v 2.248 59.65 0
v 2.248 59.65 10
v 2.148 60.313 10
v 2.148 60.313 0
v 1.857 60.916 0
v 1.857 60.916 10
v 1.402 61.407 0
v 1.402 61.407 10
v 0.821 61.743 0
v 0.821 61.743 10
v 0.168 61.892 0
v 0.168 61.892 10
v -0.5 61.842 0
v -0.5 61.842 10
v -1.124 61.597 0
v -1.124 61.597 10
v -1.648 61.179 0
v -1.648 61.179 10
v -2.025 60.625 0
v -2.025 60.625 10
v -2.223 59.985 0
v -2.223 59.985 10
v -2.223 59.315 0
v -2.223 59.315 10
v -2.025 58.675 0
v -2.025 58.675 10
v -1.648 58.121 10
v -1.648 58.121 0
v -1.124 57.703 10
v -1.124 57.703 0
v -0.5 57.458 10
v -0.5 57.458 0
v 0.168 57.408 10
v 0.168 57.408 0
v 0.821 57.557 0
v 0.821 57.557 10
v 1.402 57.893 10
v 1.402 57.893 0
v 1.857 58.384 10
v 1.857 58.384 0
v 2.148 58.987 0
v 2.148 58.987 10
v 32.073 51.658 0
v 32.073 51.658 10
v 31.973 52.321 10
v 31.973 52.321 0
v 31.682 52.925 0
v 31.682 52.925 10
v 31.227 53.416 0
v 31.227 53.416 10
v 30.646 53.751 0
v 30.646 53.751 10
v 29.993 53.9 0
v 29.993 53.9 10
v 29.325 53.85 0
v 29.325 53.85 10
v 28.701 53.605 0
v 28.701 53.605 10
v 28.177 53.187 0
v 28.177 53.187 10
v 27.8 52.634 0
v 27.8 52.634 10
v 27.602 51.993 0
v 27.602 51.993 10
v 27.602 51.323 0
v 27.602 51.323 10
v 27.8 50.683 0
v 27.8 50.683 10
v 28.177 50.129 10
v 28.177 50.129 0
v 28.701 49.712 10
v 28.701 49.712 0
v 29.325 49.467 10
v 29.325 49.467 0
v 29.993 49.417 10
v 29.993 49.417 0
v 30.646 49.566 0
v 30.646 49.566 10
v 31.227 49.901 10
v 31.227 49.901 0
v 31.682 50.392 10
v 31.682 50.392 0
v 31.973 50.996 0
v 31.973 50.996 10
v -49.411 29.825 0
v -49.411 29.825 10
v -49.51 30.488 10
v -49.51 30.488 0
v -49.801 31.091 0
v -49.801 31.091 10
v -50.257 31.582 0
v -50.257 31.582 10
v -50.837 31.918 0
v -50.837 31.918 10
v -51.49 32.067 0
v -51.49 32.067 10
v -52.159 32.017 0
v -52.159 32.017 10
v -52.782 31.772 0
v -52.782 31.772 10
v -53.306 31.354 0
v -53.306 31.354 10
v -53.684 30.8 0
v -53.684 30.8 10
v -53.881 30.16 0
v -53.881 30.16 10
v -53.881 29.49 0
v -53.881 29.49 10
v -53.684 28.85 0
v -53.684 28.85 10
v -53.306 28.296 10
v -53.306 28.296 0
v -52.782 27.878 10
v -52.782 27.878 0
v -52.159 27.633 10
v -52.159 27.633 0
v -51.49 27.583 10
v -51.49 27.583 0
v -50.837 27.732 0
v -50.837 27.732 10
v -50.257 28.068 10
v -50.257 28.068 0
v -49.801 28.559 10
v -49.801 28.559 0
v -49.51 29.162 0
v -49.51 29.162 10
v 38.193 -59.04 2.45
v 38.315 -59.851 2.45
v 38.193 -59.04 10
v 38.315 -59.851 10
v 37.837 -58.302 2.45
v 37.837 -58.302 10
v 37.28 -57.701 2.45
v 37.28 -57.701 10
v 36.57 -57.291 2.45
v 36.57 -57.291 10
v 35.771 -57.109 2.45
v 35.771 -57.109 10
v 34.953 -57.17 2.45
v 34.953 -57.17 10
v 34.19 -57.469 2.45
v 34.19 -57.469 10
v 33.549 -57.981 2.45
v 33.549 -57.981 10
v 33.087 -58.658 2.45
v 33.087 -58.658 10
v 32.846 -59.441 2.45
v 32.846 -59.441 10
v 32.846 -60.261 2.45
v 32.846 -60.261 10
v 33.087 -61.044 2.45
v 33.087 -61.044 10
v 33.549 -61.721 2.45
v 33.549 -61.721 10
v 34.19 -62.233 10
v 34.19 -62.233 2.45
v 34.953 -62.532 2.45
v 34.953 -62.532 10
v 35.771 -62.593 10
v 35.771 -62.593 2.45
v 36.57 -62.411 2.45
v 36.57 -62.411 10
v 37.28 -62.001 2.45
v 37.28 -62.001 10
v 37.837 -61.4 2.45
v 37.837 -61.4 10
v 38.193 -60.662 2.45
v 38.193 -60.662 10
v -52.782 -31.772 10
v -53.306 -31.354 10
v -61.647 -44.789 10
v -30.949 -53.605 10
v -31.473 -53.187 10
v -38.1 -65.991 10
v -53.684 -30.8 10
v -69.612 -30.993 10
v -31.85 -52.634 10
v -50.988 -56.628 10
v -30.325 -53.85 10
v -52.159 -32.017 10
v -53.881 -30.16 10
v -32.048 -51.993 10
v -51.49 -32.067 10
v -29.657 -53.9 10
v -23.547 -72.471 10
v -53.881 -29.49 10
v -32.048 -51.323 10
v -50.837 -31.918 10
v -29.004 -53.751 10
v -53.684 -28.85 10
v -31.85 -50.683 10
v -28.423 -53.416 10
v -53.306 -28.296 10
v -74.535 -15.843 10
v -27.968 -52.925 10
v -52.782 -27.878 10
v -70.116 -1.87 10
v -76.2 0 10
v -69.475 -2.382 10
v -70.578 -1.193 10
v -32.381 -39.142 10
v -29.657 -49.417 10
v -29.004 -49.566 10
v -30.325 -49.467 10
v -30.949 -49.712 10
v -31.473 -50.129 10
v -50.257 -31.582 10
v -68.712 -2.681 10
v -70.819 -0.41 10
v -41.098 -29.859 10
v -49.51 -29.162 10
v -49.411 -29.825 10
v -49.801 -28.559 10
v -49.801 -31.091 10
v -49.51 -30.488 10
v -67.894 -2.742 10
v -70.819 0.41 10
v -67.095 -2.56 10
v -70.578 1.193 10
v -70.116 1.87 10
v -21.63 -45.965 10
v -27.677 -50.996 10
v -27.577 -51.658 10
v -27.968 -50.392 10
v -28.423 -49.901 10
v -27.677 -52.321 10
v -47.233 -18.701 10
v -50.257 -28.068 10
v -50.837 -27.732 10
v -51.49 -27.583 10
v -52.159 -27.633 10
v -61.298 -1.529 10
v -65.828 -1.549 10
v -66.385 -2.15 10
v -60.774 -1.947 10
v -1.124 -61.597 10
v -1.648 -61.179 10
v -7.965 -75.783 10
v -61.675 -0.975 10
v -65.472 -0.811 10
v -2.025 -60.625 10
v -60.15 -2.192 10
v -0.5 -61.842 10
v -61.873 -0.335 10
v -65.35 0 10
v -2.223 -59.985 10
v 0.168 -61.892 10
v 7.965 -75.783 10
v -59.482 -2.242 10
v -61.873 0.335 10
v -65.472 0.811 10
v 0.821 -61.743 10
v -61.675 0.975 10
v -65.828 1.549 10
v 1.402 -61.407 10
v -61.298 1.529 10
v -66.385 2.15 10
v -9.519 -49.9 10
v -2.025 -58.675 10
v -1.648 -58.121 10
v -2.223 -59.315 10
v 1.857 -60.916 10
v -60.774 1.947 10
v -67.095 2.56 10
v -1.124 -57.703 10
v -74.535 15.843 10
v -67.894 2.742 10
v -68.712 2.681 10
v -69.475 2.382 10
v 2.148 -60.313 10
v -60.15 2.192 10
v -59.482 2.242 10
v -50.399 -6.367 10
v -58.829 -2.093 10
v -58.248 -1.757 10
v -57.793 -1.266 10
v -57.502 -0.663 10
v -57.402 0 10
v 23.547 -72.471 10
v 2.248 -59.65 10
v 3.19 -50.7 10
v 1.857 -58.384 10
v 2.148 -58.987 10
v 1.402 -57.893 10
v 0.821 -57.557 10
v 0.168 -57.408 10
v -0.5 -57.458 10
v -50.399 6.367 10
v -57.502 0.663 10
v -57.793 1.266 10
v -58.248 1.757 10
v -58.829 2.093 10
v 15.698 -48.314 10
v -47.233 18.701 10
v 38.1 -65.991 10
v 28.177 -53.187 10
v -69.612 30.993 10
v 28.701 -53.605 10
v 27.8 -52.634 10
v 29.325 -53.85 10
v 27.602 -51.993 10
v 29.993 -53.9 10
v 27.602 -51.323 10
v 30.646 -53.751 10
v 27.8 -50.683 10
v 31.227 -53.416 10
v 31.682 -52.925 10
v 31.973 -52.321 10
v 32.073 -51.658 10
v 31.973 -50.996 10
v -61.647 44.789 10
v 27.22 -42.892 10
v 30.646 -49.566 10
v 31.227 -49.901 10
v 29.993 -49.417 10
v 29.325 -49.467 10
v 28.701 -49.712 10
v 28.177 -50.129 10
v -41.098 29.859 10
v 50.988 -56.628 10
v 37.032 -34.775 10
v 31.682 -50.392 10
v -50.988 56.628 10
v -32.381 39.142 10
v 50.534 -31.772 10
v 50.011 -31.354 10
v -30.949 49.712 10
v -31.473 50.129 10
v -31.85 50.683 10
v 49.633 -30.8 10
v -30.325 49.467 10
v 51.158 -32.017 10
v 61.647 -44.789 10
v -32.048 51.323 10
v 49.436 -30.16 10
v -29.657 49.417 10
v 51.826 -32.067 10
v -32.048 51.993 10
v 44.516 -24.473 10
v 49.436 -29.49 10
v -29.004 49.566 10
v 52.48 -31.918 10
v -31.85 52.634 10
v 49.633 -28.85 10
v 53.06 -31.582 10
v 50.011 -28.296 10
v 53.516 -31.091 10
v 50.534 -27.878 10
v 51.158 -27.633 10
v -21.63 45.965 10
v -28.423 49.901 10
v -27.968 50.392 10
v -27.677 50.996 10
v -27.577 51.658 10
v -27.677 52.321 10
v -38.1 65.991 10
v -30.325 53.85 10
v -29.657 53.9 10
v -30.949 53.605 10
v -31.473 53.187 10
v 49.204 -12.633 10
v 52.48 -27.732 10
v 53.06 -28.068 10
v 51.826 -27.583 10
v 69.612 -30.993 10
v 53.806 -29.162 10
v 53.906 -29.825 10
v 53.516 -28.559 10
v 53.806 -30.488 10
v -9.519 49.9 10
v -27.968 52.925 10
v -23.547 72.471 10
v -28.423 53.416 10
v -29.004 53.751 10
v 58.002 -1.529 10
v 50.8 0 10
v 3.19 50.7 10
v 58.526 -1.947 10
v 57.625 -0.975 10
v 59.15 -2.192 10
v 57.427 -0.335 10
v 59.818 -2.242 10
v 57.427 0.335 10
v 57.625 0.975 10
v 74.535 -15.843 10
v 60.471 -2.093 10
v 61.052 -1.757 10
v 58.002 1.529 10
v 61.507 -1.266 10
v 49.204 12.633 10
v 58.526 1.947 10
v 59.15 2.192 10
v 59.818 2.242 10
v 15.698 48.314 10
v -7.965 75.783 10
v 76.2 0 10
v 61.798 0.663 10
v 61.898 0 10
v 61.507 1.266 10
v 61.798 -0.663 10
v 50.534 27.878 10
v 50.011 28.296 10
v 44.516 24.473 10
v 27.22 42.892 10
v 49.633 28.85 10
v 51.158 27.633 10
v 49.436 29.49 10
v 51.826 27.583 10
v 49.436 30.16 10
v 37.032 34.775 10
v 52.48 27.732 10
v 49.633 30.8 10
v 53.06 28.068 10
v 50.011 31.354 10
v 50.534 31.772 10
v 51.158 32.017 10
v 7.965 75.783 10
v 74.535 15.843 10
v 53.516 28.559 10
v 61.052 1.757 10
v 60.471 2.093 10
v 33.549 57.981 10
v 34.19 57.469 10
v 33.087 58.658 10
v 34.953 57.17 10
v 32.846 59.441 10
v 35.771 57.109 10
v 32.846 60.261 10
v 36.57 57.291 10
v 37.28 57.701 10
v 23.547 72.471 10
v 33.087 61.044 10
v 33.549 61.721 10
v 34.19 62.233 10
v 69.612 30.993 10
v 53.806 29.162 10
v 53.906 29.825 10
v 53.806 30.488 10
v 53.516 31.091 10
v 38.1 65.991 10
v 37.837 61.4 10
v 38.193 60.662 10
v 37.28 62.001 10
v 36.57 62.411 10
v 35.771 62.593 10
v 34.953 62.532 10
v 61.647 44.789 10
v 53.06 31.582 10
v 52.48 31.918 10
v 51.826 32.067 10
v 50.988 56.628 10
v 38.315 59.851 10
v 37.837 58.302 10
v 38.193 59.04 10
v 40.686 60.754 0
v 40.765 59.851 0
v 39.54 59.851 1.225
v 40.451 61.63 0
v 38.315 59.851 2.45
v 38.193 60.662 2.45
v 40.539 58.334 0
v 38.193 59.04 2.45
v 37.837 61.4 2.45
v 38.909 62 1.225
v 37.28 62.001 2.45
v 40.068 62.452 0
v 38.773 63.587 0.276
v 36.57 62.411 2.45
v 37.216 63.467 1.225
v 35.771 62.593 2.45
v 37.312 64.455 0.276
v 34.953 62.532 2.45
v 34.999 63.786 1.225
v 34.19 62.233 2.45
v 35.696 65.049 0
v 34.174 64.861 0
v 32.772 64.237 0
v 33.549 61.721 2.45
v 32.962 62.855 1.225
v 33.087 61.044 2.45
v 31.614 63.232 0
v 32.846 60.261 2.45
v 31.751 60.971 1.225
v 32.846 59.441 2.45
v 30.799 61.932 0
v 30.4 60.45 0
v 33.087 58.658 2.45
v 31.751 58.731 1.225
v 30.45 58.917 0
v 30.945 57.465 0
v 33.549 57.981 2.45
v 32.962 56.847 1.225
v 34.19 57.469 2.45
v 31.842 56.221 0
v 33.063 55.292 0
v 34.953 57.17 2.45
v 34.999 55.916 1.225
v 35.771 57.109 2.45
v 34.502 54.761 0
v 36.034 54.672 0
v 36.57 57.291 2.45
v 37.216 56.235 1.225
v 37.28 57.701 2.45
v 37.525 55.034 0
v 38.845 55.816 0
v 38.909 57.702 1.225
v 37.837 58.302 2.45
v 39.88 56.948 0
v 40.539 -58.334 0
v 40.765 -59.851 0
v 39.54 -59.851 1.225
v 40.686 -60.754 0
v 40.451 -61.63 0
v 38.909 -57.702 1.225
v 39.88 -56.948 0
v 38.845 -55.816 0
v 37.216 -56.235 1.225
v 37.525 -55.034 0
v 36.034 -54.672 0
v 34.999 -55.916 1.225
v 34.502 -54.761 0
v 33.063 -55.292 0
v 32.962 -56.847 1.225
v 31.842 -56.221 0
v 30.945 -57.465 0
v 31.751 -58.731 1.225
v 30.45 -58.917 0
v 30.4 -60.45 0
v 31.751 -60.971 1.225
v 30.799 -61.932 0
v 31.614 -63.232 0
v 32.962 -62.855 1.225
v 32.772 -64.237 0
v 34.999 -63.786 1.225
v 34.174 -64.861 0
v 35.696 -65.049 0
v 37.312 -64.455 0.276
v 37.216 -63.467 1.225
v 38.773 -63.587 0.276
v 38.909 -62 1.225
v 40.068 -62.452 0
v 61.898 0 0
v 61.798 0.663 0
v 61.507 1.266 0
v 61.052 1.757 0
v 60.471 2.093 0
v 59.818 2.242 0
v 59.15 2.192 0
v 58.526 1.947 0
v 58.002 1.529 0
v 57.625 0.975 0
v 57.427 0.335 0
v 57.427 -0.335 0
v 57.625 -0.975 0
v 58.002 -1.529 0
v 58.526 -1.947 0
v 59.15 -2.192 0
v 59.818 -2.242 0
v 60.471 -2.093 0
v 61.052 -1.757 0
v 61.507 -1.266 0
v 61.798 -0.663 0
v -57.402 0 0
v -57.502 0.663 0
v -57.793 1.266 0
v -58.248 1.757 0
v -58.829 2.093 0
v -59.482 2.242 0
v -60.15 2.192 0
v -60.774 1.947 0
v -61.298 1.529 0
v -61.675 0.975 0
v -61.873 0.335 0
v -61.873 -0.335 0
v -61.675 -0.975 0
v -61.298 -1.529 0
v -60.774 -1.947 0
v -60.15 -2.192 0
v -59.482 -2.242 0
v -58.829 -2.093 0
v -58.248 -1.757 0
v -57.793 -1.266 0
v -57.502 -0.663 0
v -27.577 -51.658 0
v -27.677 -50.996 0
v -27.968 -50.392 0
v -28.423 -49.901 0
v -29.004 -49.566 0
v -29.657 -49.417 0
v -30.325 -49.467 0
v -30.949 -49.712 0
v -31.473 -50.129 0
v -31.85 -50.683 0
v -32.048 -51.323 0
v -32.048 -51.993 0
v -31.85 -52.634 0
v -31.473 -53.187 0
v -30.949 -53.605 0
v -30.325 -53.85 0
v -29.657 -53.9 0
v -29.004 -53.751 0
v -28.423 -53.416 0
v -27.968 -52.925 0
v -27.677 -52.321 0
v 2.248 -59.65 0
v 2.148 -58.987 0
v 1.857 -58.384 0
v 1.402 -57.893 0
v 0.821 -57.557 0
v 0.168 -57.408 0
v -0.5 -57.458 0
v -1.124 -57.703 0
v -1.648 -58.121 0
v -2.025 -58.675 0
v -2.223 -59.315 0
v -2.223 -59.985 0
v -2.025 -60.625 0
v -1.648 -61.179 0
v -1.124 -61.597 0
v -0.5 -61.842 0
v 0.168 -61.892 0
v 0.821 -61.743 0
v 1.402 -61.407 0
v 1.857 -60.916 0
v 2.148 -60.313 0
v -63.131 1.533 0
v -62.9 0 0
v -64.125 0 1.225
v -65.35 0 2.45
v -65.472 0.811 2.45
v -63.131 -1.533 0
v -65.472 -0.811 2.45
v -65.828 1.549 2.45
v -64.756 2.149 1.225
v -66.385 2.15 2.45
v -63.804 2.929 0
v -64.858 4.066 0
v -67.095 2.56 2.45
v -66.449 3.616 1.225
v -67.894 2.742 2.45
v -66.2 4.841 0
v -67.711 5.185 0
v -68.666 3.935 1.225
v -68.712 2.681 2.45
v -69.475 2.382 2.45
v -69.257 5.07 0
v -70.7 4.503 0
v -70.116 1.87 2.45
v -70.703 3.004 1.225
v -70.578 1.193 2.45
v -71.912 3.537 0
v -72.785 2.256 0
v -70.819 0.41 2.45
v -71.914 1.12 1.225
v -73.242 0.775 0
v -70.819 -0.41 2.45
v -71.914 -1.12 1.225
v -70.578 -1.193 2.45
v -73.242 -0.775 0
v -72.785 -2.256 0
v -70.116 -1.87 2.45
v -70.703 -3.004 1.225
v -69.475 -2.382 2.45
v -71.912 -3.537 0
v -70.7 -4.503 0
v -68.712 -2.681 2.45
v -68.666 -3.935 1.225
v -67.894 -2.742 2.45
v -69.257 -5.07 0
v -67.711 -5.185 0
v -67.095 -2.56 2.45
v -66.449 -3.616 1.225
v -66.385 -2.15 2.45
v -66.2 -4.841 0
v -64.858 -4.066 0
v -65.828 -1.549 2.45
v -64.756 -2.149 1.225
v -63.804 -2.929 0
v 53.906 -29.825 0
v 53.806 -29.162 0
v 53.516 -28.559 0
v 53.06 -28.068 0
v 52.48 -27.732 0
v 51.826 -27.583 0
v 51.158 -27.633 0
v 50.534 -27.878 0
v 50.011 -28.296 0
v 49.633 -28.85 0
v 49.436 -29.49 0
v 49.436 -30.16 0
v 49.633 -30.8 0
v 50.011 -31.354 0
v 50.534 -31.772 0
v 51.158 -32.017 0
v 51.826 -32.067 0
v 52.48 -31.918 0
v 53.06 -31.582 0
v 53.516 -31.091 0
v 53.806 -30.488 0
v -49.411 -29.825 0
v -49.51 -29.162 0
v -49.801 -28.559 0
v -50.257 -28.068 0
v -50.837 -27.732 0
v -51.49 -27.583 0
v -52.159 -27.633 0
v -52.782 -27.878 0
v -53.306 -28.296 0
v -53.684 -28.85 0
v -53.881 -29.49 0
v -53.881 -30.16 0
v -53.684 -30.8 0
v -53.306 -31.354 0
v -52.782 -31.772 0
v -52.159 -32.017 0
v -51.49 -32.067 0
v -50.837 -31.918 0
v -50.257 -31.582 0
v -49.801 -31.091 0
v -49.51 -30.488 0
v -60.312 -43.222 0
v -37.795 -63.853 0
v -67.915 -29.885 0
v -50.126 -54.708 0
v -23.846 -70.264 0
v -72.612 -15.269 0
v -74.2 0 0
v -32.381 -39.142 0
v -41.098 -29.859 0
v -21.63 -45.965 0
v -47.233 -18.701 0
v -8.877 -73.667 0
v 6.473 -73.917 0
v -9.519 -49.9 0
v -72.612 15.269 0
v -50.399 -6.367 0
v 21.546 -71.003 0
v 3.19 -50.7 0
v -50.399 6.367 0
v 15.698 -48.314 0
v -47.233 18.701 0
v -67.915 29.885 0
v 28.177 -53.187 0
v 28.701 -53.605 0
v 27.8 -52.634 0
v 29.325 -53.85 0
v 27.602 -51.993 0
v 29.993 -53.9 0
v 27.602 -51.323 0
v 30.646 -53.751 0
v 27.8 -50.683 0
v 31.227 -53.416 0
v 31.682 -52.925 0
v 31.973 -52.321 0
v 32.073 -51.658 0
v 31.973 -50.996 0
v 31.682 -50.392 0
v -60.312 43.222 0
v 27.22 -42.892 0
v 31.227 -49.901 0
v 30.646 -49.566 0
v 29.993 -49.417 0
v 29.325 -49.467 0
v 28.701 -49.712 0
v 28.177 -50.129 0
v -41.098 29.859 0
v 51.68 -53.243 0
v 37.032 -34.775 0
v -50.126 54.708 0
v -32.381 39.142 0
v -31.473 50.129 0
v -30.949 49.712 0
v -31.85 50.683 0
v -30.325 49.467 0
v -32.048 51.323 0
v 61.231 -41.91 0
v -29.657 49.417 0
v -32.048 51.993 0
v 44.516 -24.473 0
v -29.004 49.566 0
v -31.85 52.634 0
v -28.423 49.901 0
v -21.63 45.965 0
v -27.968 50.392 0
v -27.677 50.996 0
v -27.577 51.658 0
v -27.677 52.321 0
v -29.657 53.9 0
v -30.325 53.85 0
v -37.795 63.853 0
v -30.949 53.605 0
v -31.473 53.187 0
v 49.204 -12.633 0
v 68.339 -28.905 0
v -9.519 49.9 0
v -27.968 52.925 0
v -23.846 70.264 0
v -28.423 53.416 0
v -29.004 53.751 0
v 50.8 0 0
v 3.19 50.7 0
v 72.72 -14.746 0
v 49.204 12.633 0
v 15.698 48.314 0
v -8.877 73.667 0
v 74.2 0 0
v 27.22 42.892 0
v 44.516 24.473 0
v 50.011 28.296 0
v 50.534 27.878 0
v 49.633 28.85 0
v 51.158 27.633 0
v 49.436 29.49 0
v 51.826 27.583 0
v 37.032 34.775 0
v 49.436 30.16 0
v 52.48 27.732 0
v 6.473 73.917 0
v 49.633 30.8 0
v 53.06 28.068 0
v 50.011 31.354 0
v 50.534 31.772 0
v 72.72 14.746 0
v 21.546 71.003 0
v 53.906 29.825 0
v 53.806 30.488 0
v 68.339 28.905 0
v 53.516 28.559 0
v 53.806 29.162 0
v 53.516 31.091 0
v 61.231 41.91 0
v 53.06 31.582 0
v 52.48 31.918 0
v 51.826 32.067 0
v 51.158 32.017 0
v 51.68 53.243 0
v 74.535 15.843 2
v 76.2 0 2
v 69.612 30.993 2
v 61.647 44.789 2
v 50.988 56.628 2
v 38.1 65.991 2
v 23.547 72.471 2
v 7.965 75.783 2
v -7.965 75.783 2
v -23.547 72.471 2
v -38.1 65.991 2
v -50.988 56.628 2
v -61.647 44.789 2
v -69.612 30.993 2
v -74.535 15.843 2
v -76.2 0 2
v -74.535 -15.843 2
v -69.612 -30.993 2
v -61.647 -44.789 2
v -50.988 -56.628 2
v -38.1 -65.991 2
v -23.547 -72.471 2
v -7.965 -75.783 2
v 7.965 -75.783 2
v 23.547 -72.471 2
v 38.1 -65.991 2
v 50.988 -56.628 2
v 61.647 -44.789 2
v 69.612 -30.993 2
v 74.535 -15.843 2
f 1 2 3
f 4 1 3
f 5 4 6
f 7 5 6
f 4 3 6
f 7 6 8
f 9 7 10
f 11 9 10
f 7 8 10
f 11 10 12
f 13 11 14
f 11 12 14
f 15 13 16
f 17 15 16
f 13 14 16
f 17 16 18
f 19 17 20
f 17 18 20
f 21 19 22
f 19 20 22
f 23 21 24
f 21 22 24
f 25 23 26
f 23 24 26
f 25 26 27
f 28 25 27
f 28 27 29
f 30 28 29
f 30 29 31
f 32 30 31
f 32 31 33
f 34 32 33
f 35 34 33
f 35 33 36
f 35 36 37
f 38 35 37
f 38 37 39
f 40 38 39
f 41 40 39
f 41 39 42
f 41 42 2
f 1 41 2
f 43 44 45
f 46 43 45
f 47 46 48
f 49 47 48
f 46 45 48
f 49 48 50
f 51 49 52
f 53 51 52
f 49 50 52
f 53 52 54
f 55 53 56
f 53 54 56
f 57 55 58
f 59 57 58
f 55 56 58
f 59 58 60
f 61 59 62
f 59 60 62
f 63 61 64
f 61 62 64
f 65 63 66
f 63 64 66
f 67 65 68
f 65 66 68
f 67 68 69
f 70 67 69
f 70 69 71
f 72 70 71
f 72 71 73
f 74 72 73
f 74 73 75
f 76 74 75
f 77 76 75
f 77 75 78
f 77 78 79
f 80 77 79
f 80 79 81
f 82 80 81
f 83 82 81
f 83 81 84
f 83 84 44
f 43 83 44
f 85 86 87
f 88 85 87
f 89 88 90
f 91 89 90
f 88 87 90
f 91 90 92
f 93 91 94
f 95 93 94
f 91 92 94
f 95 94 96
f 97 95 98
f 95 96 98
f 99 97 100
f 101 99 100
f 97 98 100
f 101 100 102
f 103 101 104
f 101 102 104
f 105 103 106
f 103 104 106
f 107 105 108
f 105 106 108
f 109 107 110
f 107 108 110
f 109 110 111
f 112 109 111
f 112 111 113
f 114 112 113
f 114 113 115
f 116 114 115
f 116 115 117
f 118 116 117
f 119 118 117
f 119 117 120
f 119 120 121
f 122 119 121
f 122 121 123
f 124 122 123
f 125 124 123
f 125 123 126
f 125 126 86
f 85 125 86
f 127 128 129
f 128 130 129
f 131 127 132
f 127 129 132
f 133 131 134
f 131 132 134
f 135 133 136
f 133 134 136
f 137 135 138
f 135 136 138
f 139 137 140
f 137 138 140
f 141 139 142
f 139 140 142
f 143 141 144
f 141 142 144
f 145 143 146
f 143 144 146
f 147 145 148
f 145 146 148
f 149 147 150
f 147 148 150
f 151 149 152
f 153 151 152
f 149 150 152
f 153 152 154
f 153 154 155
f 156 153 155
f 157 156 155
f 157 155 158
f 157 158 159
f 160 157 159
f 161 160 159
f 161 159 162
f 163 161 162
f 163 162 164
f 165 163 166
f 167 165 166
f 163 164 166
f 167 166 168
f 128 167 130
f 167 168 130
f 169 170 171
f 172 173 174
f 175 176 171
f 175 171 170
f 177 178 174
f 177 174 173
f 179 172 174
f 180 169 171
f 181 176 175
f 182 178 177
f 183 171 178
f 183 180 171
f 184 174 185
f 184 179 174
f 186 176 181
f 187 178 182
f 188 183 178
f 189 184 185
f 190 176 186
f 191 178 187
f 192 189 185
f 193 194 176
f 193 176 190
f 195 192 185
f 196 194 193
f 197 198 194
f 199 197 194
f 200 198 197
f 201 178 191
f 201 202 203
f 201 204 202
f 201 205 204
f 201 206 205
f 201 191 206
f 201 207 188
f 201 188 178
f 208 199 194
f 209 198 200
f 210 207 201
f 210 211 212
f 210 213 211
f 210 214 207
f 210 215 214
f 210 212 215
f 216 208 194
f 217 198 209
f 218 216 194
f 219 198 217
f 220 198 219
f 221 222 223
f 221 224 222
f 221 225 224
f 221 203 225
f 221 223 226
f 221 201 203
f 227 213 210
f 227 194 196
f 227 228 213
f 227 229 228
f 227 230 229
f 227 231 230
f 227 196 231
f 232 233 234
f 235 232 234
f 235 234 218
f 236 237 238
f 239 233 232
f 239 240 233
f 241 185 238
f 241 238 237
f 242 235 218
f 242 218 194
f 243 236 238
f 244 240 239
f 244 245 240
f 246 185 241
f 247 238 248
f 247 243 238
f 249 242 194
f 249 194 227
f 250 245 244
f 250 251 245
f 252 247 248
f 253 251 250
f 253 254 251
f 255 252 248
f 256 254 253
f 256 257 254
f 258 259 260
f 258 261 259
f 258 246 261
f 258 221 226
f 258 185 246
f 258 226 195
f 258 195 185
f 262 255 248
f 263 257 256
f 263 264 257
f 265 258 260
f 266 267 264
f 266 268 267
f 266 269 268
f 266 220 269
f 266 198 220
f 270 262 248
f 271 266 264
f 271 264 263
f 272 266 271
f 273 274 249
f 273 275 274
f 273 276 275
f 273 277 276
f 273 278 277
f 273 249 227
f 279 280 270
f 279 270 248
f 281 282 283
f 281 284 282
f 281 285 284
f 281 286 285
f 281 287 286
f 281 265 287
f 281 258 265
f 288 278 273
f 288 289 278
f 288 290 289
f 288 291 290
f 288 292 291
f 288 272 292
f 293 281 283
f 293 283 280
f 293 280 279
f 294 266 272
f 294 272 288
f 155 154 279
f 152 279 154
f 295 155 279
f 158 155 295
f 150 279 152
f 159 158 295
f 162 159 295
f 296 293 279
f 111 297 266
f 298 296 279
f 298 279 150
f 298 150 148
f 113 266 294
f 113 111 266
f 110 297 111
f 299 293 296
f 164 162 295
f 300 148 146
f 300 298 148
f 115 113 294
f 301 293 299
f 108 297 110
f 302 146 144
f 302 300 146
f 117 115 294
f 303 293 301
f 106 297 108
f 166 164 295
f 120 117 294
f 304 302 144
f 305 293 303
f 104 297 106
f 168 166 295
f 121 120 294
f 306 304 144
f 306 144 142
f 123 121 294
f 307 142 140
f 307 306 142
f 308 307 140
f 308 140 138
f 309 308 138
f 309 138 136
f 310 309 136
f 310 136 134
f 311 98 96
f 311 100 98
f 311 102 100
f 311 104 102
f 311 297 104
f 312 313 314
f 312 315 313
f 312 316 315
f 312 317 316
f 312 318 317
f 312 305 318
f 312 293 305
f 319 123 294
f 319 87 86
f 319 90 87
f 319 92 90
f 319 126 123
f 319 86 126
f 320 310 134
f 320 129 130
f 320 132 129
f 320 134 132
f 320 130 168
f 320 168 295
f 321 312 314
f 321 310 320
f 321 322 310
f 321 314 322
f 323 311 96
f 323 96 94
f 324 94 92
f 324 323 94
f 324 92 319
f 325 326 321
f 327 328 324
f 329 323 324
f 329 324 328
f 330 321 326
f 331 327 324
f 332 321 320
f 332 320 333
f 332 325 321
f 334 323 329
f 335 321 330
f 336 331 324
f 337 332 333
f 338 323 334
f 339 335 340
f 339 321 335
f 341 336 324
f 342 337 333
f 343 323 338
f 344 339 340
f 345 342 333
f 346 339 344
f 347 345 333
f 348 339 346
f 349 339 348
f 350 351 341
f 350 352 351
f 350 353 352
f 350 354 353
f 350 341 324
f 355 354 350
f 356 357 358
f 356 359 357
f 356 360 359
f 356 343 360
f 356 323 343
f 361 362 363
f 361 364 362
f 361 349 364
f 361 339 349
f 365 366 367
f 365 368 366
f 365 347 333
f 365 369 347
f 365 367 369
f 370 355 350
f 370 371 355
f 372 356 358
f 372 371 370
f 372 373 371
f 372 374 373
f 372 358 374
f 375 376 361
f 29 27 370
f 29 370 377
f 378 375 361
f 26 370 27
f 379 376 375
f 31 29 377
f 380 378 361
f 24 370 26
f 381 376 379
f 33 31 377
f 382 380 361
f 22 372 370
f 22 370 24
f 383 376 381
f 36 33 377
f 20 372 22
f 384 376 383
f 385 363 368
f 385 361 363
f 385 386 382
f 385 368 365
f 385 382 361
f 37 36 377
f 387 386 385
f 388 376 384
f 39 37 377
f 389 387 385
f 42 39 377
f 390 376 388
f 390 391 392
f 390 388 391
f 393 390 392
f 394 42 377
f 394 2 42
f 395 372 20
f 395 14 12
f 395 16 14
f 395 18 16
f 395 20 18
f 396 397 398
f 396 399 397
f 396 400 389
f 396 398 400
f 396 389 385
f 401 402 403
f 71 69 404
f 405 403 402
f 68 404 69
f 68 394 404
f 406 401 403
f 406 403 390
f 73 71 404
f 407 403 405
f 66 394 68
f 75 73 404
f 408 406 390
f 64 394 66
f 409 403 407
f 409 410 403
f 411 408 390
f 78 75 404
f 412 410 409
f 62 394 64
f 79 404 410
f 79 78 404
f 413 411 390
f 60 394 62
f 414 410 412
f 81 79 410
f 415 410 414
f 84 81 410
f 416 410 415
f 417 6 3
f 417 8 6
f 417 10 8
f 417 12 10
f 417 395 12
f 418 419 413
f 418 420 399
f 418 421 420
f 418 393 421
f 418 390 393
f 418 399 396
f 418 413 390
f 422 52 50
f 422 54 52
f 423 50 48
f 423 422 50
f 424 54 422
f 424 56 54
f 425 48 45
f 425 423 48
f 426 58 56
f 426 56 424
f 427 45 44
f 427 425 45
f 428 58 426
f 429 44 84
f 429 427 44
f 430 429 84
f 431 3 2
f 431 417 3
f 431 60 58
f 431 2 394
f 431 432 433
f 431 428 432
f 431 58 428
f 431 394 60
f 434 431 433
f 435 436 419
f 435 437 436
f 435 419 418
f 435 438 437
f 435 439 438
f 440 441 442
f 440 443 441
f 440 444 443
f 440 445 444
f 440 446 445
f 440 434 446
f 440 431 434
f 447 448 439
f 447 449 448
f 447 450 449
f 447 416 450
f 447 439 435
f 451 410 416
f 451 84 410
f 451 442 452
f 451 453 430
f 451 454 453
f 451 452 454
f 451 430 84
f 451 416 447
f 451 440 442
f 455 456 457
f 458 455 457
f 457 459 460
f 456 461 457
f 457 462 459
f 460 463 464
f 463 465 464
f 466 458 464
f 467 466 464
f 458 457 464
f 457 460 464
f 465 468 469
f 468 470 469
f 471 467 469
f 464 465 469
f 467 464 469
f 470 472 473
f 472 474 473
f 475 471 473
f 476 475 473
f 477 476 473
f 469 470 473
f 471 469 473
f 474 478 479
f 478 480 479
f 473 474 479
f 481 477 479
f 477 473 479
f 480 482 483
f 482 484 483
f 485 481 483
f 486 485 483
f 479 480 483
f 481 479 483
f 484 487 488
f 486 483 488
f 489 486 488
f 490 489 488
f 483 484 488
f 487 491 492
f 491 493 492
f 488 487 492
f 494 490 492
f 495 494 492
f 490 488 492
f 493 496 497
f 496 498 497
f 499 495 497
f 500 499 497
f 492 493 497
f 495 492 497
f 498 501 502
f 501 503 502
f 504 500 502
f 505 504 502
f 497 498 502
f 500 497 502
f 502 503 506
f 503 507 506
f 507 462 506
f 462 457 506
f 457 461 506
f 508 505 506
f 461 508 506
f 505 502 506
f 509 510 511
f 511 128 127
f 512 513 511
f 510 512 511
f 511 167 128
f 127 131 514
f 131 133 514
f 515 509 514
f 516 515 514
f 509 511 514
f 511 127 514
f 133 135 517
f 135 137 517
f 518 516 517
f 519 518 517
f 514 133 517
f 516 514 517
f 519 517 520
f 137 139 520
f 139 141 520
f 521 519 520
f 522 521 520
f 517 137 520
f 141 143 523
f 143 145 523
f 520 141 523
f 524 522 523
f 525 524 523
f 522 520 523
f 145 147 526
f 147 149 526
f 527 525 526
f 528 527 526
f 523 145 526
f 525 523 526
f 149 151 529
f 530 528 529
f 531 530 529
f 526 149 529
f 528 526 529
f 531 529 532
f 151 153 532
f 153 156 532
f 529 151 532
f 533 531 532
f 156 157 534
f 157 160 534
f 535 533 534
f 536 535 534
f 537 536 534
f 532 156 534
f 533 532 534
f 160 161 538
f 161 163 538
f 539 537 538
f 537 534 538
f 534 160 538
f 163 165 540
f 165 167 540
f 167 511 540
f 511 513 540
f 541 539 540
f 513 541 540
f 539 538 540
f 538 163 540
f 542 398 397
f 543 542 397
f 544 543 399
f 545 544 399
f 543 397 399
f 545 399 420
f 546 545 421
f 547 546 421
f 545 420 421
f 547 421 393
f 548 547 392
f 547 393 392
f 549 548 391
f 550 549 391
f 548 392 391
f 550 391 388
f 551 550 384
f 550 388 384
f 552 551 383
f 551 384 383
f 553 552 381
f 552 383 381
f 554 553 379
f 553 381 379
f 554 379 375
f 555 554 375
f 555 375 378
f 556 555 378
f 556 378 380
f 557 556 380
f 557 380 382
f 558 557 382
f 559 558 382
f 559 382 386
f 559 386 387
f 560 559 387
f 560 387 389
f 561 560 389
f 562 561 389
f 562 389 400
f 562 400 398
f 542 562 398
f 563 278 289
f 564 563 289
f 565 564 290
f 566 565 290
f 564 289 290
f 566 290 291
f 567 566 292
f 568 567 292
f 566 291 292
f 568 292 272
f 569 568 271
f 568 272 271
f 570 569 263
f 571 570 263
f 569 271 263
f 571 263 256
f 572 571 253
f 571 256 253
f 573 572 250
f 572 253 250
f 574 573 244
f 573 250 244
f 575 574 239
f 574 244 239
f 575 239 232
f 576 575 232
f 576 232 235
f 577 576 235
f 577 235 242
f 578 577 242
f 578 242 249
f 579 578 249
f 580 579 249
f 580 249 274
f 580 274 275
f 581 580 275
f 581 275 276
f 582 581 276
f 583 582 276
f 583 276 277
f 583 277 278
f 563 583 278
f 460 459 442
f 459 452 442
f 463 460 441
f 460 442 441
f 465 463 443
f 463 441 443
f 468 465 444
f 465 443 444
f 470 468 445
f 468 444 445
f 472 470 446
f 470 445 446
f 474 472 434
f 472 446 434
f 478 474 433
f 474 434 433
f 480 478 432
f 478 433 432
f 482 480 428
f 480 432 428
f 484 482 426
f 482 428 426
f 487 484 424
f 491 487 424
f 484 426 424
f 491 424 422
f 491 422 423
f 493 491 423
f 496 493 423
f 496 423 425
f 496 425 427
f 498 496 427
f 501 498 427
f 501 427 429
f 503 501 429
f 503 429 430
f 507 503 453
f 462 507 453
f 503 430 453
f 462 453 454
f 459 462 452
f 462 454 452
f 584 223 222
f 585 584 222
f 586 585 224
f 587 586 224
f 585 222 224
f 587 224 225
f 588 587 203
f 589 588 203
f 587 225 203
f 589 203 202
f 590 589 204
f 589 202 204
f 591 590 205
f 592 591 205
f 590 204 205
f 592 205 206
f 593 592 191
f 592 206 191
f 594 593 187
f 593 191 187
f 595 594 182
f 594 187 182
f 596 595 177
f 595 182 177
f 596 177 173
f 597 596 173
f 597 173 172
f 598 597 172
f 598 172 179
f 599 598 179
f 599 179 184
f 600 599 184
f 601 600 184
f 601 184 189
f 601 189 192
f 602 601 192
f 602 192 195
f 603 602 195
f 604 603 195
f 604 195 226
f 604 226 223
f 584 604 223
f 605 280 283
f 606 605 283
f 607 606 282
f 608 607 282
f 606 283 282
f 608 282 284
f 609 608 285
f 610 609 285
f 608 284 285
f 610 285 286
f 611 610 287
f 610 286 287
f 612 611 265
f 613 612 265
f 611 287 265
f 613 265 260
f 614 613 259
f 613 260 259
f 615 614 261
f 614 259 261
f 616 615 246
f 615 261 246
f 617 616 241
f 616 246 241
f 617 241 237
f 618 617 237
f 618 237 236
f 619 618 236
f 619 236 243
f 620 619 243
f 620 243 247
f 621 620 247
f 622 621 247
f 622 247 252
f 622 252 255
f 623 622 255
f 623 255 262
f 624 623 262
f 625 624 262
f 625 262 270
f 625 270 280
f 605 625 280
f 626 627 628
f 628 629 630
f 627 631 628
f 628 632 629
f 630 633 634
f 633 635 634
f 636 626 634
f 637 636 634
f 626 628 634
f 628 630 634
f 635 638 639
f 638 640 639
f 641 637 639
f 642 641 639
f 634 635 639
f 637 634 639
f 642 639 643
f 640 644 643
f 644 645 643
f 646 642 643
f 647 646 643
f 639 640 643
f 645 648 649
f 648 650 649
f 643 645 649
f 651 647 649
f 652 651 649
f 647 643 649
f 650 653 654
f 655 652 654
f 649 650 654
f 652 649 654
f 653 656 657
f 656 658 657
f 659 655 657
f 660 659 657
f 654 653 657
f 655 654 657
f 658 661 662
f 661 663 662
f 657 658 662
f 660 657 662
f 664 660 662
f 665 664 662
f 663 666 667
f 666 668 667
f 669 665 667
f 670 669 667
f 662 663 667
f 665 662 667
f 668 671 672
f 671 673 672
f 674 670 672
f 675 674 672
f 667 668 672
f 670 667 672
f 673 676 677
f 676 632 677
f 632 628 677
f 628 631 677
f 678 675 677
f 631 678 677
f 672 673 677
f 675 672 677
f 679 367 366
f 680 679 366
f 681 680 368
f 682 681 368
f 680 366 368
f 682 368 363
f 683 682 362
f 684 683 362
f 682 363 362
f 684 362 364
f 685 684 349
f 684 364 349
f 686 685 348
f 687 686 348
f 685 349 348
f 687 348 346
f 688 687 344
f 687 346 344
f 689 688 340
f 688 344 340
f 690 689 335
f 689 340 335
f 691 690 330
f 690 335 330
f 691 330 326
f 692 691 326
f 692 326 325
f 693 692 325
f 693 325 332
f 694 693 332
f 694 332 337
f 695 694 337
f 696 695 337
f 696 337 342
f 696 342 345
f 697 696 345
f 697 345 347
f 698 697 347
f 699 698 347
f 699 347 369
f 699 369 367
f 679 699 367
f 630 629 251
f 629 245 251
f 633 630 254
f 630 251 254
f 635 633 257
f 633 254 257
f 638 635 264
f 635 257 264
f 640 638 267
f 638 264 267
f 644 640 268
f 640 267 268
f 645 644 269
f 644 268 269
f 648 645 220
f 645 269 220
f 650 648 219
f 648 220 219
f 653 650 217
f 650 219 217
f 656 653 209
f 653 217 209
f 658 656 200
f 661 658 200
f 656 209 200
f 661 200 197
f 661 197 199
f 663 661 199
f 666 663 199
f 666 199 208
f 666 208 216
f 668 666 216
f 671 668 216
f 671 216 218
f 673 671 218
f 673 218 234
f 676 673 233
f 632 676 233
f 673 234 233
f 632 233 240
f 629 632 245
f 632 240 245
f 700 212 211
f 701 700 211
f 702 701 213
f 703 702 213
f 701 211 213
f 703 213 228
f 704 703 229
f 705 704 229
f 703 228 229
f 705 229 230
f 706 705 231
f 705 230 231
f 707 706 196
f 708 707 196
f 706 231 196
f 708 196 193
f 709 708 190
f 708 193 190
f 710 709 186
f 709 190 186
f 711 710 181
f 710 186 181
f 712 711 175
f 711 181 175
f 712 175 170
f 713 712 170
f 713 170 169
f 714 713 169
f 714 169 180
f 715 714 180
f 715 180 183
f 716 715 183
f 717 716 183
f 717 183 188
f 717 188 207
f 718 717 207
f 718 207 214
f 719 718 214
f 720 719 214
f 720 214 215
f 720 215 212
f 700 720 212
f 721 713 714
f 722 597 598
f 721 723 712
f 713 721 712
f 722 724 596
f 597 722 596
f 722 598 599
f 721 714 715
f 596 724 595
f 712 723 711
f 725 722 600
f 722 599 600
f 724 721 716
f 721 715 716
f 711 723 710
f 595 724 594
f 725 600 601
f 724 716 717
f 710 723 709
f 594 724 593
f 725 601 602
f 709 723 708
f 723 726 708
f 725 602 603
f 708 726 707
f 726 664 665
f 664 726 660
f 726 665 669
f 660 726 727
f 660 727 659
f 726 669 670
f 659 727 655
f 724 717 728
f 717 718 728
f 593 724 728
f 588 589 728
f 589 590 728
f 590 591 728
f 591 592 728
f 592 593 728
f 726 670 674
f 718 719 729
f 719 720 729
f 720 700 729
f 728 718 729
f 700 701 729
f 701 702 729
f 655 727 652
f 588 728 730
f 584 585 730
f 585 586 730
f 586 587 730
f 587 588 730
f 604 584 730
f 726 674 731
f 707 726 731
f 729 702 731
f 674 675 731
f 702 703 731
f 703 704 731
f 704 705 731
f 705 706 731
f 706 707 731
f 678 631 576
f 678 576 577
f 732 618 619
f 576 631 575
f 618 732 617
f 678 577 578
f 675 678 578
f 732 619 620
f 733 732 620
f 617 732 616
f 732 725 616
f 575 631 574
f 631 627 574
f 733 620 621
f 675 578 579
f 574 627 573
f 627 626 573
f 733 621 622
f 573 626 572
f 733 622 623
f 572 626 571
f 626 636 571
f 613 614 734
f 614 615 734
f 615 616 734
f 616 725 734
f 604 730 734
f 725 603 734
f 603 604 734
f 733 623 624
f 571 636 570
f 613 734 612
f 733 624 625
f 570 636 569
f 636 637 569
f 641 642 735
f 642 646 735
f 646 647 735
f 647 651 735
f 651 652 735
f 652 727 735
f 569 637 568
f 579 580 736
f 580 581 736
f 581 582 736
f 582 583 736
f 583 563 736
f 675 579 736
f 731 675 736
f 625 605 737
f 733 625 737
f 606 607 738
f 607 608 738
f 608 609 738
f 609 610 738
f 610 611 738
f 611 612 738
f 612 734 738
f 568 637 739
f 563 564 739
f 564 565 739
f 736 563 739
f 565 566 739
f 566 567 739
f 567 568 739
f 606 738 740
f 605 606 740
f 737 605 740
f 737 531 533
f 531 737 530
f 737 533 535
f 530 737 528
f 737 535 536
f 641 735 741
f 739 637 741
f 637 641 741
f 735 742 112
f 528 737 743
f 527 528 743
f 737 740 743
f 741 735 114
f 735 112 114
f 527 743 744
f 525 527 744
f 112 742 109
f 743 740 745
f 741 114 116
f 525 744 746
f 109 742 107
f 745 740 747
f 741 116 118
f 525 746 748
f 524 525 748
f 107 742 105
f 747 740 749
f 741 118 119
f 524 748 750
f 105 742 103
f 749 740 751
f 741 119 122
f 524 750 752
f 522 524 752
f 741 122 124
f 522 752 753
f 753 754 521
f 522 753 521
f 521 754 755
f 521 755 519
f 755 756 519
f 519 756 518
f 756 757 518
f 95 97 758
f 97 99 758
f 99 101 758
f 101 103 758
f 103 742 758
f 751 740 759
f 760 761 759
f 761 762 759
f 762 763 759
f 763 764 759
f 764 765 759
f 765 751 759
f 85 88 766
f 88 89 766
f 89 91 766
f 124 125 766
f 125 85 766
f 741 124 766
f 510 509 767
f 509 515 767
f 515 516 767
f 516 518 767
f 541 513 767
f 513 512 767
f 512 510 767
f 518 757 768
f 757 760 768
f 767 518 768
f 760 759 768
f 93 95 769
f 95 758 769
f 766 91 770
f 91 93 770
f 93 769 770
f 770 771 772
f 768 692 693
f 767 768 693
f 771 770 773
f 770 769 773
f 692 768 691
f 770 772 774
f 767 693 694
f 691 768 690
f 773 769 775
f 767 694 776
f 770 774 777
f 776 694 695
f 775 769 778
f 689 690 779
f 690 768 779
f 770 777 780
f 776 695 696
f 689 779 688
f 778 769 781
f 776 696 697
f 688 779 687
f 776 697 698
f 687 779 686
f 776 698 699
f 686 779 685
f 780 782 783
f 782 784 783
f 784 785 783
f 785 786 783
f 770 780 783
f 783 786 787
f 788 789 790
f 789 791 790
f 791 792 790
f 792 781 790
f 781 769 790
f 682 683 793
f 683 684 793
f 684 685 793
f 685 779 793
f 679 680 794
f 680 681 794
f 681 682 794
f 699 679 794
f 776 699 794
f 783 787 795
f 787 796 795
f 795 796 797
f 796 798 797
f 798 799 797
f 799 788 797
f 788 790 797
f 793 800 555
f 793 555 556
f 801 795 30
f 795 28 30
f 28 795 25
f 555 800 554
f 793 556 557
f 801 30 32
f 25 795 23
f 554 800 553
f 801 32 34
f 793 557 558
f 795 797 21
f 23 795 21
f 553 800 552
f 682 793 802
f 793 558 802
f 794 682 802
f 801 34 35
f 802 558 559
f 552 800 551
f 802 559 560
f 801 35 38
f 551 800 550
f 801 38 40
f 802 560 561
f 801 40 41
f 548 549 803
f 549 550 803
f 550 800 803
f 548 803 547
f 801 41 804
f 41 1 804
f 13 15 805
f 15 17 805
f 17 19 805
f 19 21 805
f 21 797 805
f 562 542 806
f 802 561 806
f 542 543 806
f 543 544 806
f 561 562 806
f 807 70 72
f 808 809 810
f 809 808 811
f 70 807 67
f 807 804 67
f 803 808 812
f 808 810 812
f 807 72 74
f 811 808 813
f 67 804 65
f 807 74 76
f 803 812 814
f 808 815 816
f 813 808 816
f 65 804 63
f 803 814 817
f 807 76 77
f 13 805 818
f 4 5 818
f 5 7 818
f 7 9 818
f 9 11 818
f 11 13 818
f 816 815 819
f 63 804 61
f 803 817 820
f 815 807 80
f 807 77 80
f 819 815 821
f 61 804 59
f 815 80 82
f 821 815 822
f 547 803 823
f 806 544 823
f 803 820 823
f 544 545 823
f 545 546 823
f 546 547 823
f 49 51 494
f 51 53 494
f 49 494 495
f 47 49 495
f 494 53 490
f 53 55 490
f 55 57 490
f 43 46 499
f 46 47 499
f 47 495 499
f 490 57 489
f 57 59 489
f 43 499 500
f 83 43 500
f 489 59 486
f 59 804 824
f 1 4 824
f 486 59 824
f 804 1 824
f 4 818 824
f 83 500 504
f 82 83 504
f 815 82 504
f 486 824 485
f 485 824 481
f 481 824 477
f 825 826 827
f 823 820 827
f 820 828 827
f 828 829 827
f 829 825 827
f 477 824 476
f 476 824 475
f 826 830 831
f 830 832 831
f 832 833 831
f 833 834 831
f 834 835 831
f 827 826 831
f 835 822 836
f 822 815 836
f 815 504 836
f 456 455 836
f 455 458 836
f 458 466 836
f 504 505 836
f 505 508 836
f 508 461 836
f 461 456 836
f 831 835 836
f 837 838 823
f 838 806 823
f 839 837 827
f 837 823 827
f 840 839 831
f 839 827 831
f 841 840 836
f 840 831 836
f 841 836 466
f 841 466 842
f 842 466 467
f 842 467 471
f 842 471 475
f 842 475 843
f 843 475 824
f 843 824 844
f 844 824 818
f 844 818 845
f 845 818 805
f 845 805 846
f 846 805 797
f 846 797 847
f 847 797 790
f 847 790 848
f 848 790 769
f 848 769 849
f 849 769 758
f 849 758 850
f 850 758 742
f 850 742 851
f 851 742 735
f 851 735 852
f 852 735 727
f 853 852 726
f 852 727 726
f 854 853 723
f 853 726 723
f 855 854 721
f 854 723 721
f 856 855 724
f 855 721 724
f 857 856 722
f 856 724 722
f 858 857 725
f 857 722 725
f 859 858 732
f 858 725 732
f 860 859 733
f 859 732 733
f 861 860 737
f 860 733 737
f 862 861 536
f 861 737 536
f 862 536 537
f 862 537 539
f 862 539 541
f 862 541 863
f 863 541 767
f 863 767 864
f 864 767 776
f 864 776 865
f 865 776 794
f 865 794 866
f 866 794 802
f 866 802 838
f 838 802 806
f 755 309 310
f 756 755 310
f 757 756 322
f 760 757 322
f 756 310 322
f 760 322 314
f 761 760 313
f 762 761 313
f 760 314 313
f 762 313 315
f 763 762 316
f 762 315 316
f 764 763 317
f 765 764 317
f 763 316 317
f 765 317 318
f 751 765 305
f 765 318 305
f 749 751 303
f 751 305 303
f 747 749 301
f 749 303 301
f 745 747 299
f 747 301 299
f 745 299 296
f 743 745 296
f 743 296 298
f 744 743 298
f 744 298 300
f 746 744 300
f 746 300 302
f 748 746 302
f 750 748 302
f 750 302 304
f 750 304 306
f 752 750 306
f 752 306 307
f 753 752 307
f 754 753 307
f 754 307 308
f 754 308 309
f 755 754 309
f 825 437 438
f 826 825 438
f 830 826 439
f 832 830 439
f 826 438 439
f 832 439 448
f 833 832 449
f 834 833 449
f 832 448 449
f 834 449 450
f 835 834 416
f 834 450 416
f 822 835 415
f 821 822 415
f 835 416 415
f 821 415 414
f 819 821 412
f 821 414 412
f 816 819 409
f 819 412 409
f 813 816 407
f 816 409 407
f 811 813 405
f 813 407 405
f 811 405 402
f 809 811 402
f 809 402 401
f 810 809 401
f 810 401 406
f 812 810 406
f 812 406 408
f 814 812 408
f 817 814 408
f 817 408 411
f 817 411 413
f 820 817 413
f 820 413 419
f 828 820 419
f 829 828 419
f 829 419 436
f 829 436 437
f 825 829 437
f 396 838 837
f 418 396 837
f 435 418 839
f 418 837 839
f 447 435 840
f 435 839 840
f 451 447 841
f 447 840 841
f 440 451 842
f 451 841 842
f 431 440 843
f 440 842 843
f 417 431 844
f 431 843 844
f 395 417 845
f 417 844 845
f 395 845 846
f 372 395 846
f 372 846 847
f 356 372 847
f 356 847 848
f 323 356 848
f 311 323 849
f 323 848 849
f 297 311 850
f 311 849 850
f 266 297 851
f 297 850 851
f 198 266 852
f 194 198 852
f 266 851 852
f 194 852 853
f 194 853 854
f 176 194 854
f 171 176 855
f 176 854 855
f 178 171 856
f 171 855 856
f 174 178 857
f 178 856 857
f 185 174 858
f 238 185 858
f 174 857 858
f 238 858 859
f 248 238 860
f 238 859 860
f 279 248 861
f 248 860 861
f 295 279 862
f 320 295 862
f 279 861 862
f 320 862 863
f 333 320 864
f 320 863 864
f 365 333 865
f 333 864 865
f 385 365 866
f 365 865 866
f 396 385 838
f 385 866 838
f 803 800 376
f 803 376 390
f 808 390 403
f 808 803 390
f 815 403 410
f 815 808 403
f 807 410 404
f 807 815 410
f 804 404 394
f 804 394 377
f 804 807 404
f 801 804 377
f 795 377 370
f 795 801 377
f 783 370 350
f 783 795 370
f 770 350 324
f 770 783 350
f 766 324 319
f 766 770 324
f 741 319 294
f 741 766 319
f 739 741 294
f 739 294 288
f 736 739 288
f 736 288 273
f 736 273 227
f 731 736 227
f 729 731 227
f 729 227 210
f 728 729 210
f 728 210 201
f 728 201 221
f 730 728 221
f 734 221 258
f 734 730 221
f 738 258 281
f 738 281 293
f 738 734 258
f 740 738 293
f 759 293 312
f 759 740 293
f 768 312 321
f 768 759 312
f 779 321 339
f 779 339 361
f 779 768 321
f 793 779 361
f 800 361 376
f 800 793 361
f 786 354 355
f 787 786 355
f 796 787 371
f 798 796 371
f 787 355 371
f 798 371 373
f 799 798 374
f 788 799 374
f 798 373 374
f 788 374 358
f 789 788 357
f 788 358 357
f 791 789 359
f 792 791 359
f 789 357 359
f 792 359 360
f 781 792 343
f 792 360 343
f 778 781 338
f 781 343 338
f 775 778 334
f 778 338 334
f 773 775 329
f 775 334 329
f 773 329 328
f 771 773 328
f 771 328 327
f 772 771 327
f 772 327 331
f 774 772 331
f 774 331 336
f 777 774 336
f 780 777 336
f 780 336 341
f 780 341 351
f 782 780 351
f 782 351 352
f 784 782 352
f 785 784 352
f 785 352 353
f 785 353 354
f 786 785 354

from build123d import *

# Parameters (mm, degrees)
ESQUISSE2_R                                    = 76.2
ESQUISSE2_R_2                                  = 50.8
BOSS_EXTRU_1_DEPTH                             = 10
CHANFREIN1_SIZE                                = 2
D_GAGEMENT_81_D                                = 4.4958
FRAISAGE_POUR_VIS_T_TE_FRAIS_E_M51_D           = 5.5
FRAISAGE_POUR_VIS_T_TE_FRAIS_E_M51_CSINK_D     = 10.4
FRAISAGE_POUR_VIS_T_TE_FRAIS_E_M51_CSINK_ANGLE = 90


with BuildPart() as part:
    # Esquisse2 → Boss.-Extru.1 (new body)
    with BuildSketch(Plane.XY):
        Circle(ESQUISSE2_R)
        Circle(ESQUISSE2_R_2, mode=Mode.SUBTRACT)
    extrude(amount=BOSS_EXTRU_1_DEPTH)

    # Chanfrein1
    chanfrein1_edges = [part.edges().sort_by_distance(p)[0] for p in [
        (-76.2, 0, 0),
    ]]
    chamfer(chanfrein1_edges, length=CHANFREIN1_SIZE)

    # Dégagement #81 (through all)
    with Locations(Plane(origin=(0, 0, 0), x_dir=(-1, 0, 0), z_dir=(0, 0, -1))):
        with Locations((0, 59.65), (51.658415336, 29.825), (29.825, 51.658415336), (59.65, 0), (51.658415336, -29.825), (29.825, -51.658415336), (0, -59.65), (-29.825, -51.658415336), (-51.658415336, -29.825), (-59.65, 0), (-51.658415336, 29.825), (-29.825, 51.658415336)):
            Hole(D_GAGEMENT_81_D / 2)

    # Fraisage pour vis à tête fraisée M51 (through all)
    with Locations(Plane(origin=(0, 0, 0), x_dir=(-1, 0, 0), z_dir=(0, 0, -1))):
        with Locations((68.1, 0), (-35.565, -59.851015656), (-35.565, 59.851015656)):
            CounterSinkHole(FRAISAGE_POUR_VIS_T_TE_FRAIS_E_M51_D / 2, FRAISAGE_POUR_VIS_T_TE_FRAIS_E_M51_CSINK_D / 2, counter_sink_angle=FRAISAGE_POUR_VIS_T_TE_FRAIS_E_M51_CSINK_ANGLE)


solid = part.part
